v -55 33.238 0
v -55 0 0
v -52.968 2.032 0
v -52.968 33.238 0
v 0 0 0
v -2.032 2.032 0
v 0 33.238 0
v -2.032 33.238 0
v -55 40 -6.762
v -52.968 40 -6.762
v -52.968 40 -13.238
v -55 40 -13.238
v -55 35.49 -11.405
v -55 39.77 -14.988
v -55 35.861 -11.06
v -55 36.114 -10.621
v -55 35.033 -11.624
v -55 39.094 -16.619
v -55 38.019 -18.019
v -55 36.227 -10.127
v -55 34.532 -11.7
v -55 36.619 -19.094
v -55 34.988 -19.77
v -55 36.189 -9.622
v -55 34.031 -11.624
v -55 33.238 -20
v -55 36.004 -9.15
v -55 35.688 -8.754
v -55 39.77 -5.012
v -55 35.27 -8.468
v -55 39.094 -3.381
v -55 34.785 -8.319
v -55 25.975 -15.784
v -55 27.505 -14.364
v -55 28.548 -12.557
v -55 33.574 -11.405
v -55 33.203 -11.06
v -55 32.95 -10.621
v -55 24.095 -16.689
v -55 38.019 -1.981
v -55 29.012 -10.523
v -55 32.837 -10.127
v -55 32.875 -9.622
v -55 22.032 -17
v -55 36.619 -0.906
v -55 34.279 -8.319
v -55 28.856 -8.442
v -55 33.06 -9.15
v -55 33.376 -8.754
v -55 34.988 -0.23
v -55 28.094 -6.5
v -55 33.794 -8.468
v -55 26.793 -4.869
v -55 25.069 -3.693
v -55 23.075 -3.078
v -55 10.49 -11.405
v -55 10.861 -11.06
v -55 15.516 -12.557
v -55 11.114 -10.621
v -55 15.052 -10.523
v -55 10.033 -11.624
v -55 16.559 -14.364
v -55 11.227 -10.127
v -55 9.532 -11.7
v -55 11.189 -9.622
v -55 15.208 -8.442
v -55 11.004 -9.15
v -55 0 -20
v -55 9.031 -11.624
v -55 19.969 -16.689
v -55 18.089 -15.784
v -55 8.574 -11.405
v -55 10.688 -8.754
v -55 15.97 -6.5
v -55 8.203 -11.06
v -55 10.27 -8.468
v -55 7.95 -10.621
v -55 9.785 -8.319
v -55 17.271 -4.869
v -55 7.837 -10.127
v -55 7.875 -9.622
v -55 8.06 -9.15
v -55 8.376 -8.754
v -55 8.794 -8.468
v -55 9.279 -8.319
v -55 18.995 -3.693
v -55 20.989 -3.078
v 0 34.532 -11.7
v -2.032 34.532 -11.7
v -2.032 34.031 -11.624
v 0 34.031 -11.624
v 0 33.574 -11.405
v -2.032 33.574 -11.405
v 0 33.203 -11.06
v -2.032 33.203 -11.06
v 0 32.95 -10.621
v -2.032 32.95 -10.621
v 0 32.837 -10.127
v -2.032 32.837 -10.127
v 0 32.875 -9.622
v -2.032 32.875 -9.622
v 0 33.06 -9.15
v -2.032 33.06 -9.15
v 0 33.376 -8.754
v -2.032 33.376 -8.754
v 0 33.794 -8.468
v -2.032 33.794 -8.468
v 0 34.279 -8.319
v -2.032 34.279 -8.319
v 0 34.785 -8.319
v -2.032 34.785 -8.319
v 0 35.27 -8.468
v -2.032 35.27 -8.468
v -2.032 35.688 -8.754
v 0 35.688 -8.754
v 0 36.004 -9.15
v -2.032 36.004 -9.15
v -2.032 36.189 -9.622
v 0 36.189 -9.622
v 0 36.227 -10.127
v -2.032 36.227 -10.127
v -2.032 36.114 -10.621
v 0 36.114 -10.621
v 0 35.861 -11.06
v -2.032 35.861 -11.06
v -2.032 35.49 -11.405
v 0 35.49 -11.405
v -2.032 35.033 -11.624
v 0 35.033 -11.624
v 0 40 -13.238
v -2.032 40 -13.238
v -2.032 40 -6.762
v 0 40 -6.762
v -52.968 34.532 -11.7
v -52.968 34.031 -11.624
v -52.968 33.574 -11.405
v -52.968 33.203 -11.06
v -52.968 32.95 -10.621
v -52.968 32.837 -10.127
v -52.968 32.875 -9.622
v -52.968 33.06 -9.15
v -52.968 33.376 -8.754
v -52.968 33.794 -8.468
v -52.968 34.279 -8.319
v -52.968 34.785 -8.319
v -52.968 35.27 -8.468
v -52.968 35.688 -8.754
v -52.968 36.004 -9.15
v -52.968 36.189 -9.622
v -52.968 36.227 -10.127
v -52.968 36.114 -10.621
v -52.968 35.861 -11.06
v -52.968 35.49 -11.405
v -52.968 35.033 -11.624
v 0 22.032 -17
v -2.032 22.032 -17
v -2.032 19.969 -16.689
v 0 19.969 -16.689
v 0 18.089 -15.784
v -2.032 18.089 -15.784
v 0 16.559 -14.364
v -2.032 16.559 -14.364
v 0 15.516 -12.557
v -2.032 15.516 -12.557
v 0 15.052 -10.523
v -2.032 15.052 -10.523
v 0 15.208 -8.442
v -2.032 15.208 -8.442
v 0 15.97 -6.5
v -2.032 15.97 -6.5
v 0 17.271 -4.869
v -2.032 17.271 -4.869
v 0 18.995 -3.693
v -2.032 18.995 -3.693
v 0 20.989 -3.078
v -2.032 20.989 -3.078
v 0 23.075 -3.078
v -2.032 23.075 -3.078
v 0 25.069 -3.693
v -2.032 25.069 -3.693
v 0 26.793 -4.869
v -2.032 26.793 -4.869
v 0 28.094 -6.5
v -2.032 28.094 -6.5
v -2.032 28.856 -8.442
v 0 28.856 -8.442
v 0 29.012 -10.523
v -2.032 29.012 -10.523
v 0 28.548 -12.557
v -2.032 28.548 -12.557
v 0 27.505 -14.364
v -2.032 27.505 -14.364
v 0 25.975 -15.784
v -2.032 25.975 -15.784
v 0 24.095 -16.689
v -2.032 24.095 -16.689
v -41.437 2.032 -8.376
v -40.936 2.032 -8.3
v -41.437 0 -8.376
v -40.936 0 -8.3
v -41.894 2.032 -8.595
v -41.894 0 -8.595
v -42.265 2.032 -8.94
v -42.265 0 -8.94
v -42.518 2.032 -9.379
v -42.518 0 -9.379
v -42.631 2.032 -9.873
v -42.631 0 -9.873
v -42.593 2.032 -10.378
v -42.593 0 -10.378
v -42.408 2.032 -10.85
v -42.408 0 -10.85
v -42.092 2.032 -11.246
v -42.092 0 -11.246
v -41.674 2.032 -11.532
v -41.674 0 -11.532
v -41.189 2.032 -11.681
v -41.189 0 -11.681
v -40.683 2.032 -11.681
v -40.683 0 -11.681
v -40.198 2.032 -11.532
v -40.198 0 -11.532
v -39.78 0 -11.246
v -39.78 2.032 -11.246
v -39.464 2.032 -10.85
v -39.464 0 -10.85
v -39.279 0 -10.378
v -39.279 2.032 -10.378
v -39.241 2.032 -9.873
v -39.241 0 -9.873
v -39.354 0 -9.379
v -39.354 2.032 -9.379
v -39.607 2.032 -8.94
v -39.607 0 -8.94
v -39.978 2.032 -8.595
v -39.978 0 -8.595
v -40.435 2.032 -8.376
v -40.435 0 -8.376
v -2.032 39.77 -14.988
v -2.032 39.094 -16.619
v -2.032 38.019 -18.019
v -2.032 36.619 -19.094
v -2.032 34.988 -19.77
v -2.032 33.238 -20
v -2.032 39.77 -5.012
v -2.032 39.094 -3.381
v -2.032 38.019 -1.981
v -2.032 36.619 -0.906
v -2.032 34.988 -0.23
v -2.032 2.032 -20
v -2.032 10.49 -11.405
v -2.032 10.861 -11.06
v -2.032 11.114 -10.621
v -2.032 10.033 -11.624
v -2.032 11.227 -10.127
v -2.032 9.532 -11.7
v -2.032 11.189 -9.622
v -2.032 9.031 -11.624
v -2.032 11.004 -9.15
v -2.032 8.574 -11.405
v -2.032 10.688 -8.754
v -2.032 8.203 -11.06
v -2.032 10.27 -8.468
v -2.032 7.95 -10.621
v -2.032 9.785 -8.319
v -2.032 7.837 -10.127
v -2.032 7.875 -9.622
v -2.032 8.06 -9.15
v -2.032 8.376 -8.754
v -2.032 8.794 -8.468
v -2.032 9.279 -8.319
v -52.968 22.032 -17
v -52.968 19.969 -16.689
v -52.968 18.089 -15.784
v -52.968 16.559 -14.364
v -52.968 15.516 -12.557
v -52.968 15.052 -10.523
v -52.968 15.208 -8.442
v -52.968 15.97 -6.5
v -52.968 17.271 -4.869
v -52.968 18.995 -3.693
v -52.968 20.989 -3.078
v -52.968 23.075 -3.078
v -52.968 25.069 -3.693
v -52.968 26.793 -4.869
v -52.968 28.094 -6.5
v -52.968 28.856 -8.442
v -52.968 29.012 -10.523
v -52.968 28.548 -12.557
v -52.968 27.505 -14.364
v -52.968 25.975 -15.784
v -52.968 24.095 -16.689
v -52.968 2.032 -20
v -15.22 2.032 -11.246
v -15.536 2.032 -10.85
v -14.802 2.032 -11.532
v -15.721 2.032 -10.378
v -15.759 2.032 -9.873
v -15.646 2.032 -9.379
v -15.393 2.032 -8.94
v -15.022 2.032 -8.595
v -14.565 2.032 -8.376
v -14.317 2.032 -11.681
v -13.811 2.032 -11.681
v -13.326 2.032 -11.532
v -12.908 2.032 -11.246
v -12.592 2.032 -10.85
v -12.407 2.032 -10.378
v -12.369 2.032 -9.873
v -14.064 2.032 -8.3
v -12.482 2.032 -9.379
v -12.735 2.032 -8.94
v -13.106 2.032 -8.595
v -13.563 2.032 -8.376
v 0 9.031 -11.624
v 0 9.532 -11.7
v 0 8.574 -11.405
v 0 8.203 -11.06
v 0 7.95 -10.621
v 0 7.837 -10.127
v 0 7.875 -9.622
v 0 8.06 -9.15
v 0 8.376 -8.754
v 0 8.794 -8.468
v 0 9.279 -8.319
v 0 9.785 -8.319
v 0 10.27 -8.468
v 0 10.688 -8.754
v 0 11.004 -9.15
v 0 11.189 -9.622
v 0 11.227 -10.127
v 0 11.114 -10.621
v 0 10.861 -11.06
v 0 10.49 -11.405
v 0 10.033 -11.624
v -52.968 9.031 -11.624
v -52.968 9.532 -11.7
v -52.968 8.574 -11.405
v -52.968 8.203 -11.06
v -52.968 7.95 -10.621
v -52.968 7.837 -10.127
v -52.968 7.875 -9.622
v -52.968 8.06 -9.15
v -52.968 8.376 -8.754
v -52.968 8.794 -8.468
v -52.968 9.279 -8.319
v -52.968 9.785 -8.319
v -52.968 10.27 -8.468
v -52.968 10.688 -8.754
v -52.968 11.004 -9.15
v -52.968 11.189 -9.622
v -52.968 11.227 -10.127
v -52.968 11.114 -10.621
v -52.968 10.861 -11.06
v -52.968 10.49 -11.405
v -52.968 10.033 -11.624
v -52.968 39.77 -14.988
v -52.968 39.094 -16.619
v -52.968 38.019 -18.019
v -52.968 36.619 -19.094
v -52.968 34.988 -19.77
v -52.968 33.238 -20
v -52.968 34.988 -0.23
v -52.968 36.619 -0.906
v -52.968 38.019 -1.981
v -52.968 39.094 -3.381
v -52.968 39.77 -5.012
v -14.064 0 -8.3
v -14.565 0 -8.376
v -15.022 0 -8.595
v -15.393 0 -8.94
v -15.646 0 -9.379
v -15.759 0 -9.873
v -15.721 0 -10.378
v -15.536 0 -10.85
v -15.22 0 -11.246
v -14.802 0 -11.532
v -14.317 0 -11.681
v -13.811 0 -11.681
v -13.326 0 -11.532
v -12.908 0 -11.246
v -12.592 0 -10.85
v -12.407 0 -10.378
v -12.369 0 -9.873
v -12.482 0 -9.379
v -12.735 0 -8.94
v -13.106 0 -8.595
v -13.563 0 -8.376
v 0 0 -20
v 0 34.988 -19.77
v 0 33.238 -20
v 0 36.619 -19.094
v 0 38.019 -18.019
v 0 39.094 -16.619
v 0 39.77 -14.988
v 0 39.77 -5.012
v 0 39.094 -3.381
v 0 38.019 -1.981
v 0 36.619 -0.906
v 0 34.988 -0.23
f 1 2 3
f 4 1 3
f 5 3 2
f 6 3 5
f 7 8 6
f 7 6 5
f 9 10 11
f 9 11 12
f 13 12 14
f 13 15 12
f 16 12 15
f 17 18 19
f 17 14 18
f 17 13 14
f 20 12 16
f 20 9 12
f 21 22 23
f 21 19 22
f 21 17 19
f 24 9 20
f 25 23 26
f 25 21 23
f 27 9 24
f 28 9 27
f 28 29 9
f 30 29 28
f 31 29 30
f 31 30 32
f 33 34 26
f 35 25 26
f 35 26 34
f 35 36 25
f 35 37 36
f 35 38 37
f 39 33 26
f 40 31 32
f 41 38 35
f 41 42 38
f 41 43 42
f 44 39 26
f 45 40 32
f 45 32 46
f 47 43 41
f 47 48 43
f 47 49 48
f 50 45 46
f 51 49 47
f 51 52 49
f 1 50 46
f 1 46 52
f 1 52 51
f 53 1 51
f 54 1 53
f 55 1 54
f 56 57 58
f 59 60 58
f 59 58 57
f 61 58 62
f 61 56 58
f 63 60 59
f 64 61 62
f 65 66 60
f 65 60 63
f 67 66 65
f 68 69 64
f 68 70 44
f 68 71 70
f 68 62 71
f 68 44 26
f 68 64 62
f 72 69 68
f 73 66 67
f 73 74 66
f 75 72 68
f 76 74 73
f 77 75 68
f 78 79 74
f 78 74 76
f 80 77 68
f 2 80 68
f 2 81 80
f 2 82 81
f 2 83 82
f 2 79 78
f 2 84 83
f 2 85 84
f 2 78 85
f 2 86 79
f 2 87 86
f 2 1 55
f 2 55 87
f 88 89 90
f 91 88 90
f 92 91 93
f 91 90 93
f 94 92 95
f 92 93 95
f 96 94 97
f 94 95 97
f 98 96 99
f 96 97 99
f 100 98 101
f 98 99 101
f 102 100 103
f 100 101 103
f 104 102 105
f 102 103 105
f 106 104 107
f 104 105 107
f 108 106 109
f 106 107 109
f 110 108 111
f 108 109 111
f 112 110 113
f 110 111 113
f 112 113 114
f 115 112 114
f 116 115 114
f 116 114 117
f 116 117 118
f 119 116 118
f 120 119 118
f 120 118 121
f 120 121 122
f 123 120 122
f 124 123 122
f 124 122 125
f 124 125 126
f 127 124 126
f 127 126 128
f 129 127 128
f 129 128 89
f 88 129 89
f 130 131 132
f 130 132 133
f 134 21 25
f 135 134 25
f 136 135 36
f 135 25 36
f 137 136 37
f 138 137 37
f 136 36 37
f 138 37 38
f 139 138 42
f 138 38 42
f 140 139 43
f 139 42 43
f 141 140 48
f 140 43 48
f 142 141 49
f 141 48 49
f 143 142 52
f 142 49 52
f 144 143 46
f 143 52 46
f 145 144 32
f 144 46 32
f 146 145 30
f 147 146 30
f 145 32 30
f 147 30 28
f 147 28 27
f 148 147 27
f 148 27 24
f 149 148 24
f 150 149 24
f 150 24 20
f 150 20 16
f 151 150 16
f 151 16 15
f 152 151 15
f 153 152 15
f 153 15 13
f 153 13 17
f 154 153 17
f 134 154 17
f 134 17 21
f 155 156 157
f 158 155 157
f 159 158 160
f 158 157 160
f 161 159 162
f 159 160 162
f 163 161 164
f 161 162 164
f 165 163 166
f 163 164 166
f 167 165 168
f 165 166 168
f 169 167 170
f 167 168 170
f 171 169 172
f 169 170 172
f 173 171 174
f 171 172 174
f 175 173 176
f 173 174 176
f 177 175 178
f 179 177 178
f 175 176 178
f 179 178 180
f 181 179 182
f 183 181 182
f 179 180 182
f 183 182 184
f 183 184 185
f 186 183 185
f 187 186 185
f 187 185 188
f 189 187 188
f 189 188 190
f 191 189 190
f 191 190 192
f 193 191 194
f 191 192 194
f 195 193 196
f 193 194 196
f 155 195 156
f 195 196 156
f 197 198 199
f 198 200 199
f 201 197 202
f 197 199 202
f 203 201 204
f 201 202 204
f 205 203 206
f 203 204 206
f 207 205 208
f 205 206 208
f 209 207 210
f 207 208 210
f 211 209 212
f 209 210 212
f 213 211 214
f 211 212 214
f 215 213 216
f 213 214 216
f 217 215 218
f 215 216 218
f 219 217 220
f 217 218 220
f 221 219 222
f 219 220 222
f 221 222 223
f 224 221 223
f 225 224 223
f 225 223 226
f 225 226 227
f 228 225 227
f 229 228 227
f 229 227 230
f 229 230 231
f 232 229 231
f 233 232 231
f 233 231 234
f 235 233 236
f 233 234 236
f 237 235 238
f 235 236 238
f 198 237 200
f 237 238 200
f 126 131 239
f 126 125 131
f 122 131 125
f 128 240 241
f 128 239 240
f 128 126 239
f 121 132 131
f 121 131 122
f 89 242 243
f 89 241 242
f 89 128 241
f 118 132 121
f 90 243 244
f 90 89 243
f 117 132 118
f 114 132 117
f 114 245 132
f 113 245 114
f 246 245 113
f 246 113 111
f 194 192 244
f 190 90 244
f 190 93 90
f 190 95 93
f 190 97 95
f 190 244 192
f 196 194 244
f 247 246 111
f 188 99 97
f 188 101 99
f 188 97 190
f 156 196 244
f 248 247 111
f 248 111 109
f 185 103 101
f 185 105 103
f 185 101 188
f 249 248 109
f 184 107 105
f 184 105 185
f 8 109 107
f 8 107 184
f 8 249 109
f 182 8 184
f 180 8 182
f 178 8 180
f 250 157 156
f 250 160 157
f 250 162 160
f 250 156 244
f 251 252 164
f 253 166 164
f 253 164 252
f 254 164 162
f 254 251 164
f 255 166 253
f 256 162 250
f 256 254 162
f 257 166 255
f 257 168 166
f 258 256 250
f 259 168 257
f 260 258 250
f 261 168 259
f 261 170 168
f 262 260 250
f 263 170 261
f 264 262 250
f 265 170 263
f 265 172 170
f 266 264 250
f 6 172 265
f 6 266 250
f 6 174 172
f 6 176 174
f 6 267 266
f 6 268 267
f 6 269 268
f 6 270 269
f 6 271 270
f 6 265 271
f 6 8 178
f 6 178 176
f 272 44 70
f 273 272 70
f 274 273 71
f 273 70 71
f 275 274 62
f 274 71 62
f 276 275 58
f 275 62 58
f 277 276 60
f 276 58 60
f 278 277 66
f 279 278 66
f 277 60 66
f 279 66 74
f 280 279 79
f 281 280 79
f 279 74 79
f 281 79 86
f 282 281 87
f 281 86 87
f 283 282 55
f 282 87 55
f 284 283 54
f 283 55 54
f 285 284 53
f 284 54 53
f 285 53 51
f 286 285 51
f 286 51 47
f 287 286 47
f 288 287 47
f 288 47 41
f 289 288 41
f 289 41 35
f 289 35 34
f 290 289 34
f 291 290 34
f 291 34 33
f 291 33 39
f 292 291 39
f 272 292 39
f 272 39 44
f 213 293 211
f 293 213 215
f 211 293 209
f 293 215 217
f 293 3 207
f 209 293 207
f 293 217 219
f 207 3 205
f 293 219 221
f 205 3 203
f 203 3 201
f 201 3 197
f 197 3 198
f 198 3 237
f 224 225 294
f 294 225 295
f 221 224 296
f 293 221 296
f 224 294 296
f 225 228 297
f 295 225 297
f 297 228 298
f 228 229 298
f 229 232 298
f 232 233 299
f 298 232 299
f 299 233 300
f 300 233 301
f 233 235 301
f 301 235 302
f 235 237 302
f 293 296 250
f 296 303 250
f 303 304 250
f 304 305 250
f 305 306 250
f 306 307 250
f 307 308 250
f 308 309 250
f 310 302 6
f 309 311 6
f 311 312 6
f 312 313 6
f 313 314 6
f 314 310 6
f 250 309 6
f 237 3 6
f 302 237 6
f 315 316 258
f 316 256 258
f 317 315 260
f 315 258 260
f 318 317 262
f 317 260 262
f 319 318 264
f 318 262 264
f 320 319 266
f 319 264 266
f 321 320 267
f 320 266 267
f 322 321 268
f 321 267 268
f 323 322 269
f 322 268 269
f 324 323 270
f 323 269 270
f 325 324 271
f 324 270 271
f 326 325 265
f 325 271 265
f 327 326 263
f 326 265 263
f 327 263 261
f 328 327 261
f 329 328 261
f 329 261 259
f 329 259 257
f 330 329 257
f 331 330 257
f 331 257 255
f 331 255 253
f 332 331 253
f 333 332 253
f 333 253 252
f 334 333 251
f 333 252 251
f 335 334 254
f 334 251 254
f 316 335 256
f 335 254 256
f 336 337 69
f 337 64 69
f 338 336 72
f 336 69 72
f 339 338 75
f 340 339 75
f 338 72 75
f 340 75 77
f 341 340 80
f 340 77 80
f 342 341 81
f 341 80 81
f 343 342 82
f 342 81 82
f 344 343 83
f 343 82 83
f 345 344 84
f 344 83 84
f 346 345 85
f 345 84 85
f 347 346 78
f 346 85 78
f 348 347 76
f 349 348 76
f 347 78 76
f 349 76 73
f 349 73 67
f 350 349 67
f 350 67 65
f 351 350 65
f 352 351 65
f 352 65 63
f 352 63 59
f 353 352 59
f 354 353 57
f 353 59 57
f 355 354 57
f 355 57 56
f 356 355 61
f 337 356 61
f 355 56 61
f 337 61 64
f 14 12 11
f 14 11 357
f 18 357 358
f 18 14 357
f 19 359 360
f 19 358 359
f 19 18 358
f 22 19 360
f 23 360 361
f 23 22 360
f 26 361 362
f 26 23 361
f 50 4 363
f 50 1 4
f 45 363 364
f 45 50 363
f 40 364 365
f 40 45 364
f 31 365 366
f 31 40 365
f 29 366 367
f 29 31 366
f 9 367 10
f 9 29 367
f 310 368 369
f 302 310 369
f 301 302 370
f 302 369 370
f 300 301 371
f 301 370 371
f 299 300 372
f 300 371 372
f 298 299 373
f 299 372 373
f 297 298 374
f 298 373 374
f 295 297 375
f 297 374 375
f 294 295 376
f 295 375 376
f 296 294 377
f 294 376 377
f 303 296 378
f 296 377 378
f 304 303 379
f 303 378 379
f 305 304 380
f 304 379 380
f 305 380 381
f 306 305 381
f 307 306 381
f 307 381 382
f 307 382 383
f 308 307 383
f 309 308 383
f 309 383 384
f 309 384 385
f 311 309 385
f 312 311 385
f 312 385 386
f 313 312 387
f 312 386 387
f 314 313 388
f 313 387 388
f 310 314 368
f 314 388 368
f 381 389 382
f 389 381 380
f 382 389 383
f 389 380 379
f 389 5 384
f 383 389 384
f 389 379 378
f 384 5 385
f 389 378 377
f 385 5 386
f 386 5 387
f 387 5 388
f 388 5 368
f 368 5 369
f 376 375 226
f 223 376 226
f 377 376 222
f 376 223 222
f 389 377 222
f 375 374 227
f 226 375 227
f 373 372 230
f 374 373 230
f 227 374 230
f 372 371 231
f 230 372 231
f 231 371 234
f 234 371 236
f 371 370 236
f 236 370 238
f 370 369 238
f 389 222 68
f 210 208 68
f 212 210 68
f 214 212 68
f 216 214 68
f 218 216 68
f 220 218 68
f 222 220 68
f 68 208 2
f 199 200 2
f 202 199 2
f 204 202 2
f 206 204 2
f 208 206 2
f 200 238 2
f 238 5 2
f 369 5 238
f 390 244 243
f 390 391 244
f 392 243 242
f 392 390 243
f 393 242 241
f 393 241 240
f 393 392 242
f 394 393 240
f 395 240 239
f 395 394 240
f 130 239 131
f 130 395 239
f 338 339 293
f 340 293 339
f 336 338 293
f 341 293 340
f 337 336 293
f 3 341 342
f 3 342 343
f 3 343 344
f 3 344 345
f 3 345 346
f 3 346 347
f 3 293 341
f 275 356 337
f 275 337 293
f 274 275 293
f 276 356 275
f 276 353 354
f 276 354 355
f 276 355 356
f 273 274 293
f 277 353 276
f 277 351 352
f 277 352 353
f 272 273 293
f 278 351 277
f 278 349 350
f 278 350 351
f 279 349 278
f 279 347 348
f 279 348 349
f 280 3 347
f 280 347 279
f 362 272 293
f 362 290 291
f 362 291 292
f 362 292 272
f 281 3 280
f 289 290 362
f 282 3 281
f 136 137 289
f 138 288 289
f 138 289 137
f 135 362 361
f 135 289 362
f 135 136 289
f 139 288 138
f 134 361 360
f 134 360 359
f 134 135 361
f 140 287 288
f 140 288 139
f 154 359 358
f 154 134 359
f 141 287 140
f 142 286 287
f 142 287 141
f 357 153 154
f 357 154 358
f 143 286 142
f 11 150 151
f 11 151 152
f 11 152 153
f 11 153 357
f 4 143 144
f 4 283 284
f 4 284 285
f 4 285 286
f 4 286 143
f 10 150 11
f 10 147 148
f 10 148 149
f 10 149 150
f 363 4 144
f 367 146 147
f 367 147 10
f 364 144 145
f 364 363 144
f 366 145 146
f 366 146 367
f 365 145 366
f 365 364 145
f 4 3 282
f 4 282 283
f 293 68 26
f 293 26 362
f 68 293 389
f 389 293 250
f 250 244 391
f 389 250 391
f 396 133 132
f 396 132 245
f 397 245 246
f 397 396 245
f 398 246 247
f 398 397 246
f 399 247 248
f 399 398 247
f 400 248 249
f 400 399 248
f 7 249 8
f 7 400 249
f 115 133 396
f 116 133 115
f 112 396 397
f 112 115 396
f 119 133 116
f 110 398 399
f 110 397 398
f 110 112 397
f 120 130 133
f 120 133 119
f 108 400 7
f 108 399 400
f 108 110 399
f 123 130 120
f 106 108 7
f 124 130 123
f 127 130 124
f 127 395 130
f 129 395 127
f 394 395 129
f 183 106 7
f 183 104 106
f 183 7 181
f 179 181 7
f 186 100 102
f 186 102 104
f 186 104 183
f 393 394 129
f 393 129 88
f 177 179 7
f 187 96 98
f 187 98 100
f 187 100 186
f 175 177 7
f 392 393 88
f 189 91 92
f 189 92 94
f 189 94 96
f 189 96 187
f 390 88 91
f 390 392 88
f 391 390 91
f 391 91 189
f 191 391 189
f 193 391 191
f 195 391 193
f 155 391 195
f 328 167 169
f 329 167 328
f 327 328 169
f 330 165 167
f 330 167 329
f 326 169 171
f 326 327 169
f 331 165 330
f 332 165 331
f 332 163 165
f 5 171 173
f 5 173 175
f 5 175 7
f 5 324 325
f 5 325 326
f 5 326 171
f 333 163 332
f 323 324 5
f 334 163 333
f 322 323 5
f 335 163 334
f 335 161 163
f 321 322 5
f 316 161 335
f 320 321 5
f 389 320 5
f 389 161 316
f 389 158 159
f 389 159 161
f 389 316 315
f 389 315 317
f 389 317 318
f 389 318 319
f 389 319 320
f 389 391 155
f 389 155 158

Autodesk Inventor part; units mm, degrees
ref_plane "YZ Plane" through (0, 0, 0) normal (1, 0, 0) x (0, 1, 0)
ref_plane "XZ Plane" through (0, 0, 0) normal (0, 1, 0) x (-1, 0, 0)
ref_plane "XY Plane" through (0, 0, 0) normal (0, 0, 1) x (1, 0, 0)
sketch "Sketch3" plane through (0, 0, 0) normal (0, 1, 0) x (-1, 0, 0)
  line L0 (55, 0) -> (0, 0)
  line L1 (0, 0) -> (0, -20)
  line L2 (0, -20) -> (55, -20)
  line L3 (55, -20) -> (55, 0)
  dimension "d9" = 55
  dimension "d10" = 20
extrude "Plate1" add sketch "Sketch3" along normal blind 2.032
sketch "Sketch4" plane through (-52.968, 0, 0) normal (-1, 0, 0) x (0, -1, 0)
  line L0 (0, -20) -> (0, 0)
  line L1 (0, 0) -> (-40, 0)
  line L2 (-40, 0) -> (-40, -20)
  line L3 (-40, -20) -> (0, -20)
edge flange "Flange1" height 40 angle 90 thickness 2.032 bend radius 2.032 thickness toward (-1, 0, 0) relief tear relief width 2.032 relief depth 1.016 corner gap 2.032 corner form 0 edges at (-55, 2.032, -10) (0, 2.032, -10) wall of the first edge with corners at (-52.968, 0, -20) (-52.968, 0, 0) (-52.968, 40, 0) (-52.968, 40, -20)
bend "Bend1"
corner "Corner1"
sketch "Sketch5" plane through (0, 40, 0) normal (1, 0, 0) x (0, 0, -1)
  line L0 (0, -35.936) -> (20, -35.936) projected
  line L1 (0, -35.936) -> (20, -35.936) projected
  line L2 (20, 0) -> (20, -35.936) projected
  line L3 (0, 0) -> (20, 0) projected
  line L4 (0, -35.936) -> (0, 0) projected
  line L5 (20, -35.936) -> (20, 0) projected
  line L6 (20, -17.968) -> (0, -17.968) construction
  line L7 (0, -35.936) -> (0, 0) projected
  point P0 (0, -40)
  point P1 (10, -5.468)
  point P2 (10, -17.968)
  point P3 (10, -30.468)
  point P4 (10, -35.936)
  point P5 (10, -17.968)
  dimension "d22" = 12.5
  dimension "d23" = 12.5
hole "Hole1" at (0, 9.532, -10) at (0, 34.532, -10) direction (-1, 0, 0) diameter 3.4 depth 55 clearance for "Socket Head Cap Screw" size "M3" standard "Ansi Metric M Profile"
hole "Hole2" at (0, 22.032, -10) direction (-1, 0, 0) diameter 14 depth 55
fillet "Fillet1" radius 6.7625 4 edges at (-53.984, 40, 0) (-53.984, 40, -20) (-1.016, 40, -20) (-1.016, 40, 0)
sketch "Sketch6" plane through (0, 2.032, 0) normal (0, 1, 0) x (1, 0, 0)
  line L0 (-4.064, 0) -> (-4.064, 20) projected
  line L1 (-50.936, 20) -> (-4.064, 20) projected
  line L2 (-50.936, 20) -> (-50.936, 0) projected
  line L3 (-4.064, 0) -> (-50.936, 0) projected
  line L4 (-4.064, 0) -> (-4.064, 20) projected
  line L5 (-4.064, 10) -> (-14.064, 10) construction
  line L6 (-40.936, 10) -> (-50.936, 10) construction
  point P0 (0, 0)
  dimension "d39" = 10
hole "Hole3" at (-40.936, 2.032, -10) at (-14.064, 2.032, -10) direction (0, -1, 0) diameter 3.4 end through all clearance for "Socket Head Cap Screw" size "M3" standard "Ansi Metric M Profile"
sketch "Sketch7" plane through (-50.936, 0, 0) normal (0, 0, 1) x (1, 0, 0)
  line L0 (48.904, 4.064) -> (50.936, 4.064) projected
  arc A0 (46.872, 2.032) -> (48.904, 4.064) centre (46.872, 4.064) ccw projected
  line L1 (46.872, 0) -> (46.872, 2.032) projected
  arc A1 (46.872, 0) -> (50.936, 4.064) centre (46.872, 4.064) ccw projected
  line L2 (-4.064, 4.064) -> (-2.032, 4.064) projected
  arc A2 (-4.064, 4.064) -> (0, 0) centre (0, 4.064) ccw projected
  line L3 (0, 2.032) -> (0, 0) projected
  arc A3 (-2.032, 4.064) -> (0, 2.032) centre (0, 4.064) ccw projected
  arc A4 (-2.032, 4.064) -> (0, 2.032) centre (0, 4.064) ccw projected
  line L4 (-2.032, 4.064) -> (-2.032, 2.032)
  line L5 (-2.032, 2.032) -> (0, 2.032)
  arc A5 (-4.064, 4.064) -> (0, 0) centre (0, 4.064) ccw projected
  line L6 (0, 0) -> (-4.064, 0)
  line L7 (-2.032, 4.064) -> (-4.064, 4.064) projected
  line L8 (-4.064, 0) -> (-4.064, 4.064)
  arc A6 (46.872, 2.032) -> (48.904, 4.064) centre (46.872, 4.064) ccw projected
  line L9 (48.904, 4.064) -> (48.904, 2.032)
  line L10 (48.904, 2.032) -> (46.872, 2.032)
  line L11 (0, 0) -> (46.872, 0) projected
  line L12 (46.872, 0) -> (50.936, 0)
  line L13 (50.936, 0) -> (50.936, 4.064)
  point P0 (50.936, 0)
  point P1 (0, 0)
extrude "Extrusion3" cut sketch "Sketch7" against normal through all contours L9 L10 A0 | A3 L5 L4
extrude "Extrusion4" add sketch "Sketch7" against normal up to surface (20 mm away) contours L13 L12 A1 | A2 L6 L8
equation "\"d29\" = Thickness"
equation "\"d11\" = Thickness"
equation "\"d12\" = BendReliefWidth"
equation "\"d13\" = BendReliefDepth"
equation "\"d14\" = MinimumRemnant"
equation "\"d15\" = TransitionRadius"
equation "\"d18\" = BendRadius"
equation "\"d19\" = CornerReliefSize"
equation "\"d20\" = GapSize"
equation "\"d21\" = JacobiRadiusSize"
equation "\"BendRadius\" = Thickness"
equation "\"BendReliefWidth\" = Thickness"
equation "\"BendReliefDepth\" = 0.5 * Thickness"
equation "\"CornerReliefSize\" = 4 * Thickness"
equation "\"MinimumRemnant\" = 2 * Thickness"
equation "\"TransitionRadius\" = BendRadius"
equation "\"JacobiRadiusSize\" = BendRadius"
equation "\"GapSize\" = Thickness"
equation "\"Thickness\" = 2.032"
properties part number "Z Idle Mount-RP"
